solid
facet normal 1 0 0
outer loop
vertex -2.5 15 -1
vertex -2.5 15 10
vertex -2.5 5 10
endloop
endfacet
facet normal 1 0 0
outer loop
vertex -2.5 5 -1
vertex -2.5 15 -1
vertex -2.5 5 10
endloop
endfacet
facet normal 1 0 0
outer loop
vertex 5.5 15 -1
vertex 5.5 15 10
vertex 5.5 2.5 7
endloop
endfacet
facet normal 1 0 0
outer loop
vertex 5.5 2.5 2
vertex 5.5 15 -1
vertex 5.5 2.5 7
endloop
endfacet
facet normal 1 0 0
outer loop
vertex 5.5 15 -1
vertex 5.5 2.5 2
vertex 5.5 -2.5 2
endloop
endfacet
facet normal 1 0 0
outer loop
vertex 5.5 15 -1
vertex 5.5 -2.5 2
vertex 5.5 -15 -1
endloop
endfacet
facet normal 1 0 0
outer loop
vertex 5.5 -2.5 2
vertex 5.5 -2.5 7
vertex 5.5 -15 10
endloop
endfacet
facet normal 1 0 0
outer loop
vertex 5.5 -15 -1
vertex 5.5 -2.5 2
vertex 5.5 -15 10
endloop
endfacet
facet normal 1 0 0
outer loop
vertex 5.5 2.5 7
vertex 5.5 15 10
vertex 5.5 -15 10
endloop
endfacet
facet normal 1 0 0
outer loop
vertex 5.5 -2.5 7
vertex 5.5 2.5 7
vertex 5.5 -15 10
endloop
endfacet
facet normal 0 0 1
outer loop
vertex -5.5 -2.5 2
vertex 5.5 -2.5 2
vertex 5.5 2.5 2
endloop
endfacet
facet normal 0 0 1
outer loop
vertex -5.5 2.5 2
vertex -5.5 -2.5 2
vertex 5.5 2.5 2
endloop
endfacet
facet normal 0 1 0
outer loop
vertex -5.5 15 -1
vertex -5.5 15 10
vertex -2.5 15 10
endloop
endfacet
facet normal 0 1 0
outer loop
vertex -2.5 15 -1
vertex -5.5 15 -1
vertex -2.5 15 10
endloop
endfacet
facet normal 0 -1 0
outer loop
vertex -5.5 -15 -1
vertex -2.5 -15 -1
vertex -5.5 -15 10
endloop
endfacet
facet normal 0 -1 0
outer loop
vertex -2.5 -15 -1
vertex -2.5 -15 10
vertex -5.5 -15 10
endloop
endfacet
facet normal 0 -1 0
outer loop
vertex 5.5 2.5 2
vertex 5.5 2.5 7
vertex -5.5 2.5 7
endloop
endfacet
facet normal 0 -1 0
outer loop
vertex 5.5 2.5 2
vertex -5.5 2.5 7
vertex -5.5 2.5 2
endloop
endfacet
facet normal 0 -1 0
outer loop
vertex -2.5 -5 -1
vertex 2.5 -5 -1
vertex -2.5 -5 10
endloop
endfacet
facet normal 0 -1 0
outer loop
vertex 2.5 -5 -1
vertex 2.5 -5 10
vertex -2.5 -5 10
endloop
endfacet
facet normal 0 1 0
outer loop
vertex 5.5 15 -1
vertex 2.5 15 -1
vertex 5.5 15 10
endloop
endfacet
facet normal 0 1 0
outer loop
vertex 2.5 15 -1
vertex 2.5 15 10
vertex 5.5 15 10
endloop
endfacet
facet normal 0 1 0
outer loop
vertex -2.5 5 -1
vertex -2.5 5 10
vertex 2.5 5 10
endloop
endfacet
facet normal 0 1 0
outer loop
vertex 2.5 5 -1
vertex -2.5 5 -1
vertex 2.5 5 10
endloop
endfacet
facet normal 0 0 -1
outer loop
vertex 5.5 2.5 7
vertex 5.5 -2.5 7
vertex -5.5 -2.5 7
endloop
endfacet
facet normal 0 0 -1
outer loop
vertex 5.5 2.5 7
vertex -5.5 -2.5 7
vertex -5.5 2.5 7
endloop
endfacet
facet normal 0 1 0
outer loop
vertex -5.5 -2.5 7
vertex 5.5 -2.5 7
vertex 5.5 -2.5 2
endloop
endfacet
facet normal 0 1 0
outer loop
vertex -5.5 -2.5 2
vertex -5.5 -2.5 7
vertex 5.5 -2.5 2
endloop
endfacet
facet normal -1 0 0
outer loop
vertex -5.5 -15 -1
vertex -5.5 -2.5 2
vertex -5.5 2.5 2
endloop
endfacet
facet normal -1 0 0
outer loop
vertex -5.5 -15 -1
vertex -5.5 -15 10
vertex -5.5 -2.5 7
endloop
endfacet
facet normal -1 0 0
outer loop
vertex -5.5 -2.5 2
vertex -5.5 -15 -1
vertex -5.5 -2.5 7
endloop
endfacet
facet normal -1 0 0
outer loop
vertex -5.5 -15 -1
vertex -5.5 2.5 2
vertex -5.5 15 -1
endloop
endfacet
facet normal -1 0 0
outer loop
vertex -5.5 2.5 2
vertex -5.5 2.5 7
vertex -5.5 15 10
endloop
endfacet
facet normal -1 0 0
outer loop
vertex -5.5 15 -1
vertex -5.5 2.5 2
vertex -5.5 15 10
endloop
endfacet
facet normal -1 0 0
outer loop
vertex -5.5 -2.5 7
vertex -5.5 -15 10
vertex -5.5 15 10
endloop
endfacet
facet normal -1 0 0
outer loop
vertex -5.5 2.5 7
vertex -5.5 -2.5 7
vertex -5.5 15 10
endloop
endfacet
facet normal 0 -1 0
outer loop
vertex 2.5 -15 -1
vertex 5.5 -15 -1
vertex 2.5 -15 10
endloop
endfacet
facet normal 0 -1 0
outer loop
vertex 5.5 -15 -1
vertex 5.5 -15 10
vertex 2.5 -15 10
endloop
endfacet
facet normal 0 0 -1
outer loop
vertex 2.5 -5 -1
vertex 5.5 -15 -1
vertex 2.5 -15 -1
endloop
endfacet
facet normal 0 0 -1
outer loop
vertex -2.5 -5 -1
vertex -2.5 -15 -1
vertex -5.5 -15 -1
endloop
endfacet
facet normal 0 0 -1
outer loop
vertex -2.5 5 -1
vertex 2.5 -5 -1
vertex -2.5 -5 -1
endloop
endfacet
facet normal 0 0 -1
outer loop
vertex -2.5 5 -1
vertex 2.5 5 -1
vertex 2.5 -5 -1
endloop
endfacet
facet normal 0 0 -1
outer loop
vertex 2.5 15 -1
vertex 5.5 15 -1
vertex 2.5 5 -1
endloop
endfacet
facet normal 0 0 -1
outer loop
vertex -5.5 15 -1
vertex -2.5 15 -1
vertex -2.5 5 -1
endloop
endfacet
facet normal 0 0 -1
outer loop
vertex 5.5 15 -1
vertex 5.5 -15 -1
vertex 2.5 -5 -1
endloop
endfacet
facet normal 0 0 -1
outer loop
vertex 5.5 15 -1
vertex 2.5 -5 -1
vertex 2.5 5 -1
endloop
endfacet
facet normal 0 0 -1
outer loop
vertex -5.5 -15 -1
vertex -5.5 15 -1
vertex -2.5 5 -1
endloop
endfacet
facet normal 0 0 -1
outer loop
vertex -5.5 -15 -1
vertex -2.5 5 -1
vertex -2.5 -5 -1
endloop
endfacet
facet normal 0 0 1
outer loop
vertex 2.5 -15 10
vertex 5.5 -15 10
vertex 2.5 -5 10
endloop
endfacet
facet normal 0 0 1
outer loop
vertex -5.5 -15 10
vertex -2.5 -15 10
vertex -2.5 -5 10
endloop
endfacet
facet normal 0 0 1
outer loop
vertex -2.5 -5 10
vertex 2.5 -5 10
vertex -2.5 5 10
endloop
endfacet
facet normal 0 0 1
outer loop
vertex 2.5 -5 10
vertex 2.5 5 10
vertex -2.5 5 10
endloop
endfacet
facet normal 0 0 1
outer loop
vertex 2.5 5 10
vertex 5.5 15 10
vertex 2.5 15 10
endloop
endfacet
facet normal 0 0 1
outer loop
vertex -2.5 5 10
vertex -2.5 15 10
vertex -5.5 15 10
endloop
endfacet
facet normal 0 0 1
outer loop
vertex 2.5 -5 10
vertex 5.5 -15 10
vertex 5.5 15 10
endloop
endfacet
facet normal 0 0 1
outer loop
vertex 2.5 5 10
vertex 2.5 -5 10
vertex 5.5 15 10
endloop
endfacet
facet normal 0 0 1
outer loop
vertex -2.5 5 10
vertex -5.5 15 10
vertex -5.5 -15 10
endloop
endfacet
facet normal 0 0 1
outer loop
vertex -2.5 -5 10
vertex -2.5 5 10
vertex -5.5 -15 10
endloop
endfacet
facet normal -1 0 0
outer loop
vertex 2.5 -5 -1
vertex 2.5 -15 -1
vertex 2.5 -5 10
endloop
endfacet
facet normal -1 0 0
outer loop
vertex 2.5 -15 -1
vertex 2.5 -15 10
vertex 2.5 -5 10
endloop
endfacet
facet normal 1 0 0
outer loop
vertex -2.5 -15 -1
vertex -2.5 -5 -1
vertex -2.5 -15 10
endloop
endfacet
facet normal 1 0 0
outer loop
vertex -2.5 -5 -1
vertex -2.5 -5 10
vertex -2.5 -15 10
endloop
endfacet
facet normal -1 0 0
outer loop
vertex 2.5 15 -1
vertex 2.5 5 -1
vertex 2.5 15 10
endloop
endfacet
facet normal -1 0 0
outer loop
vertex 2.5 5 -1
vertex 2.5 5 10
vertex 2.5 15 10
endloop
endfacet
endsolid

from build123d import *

# Parameters (mm, degrees)
BOSS_EXTRUDE1_DEPTH      = 10
BOSS_EXTRUDE1_DEPTH_BACK = 1
SKETCH2_W                = 5
SKETCH2_H                = 5
CUT_EXTRUDE1_DEPTH       = 1
CUT_EXTRUDE1_DEPTH_BACK  = 12


with BuildPart() as part:
    # Sketch1 → Boss-Extrude1 (new body, two sides)
    with BuildSketch(Plane.XY) as boss_extrude1_sk:
        Polygon((-2.5, 5), (2.5, 5), (2.5, 15), (5.5, 15), (5.5, -15), (2.5, -15), (2.5, -5), (-2.5, -5), (-2.5, -15), (-5.5, -15), (-5.5, 15), (-2.5, 15), align=None)
    extrude(amount=BOSS_EXTRUDE1_DEPTH)
    extrude(boss_extrude1_sk.sketch, amount=-BOSS_EXTRUDE1_DEPTH_BACK)

    # Sketch2 → Cut-Extrude1 (cut, two sides)
    with BuildSketch(Plane(origin=(5.5, 0, 0), x_dir=(0, 0, -1), z_dir=(1, 0, 0))) as cut_extrude1_sk:
        with Locations((-4.5, 0)):
            Rectangle(SKETCH2_W, SKETCH2_H)
    extrude(amount=CUT_EXTRUDE1_DEPTH, mode=Mode.SUBTRACT)
    extrude(cut_extrude1_sk.sketch, amount=-CUT_EXTRUDE1_DEPTH_BACK, mode=Mode.SUBTRACT)


solid = part.part
